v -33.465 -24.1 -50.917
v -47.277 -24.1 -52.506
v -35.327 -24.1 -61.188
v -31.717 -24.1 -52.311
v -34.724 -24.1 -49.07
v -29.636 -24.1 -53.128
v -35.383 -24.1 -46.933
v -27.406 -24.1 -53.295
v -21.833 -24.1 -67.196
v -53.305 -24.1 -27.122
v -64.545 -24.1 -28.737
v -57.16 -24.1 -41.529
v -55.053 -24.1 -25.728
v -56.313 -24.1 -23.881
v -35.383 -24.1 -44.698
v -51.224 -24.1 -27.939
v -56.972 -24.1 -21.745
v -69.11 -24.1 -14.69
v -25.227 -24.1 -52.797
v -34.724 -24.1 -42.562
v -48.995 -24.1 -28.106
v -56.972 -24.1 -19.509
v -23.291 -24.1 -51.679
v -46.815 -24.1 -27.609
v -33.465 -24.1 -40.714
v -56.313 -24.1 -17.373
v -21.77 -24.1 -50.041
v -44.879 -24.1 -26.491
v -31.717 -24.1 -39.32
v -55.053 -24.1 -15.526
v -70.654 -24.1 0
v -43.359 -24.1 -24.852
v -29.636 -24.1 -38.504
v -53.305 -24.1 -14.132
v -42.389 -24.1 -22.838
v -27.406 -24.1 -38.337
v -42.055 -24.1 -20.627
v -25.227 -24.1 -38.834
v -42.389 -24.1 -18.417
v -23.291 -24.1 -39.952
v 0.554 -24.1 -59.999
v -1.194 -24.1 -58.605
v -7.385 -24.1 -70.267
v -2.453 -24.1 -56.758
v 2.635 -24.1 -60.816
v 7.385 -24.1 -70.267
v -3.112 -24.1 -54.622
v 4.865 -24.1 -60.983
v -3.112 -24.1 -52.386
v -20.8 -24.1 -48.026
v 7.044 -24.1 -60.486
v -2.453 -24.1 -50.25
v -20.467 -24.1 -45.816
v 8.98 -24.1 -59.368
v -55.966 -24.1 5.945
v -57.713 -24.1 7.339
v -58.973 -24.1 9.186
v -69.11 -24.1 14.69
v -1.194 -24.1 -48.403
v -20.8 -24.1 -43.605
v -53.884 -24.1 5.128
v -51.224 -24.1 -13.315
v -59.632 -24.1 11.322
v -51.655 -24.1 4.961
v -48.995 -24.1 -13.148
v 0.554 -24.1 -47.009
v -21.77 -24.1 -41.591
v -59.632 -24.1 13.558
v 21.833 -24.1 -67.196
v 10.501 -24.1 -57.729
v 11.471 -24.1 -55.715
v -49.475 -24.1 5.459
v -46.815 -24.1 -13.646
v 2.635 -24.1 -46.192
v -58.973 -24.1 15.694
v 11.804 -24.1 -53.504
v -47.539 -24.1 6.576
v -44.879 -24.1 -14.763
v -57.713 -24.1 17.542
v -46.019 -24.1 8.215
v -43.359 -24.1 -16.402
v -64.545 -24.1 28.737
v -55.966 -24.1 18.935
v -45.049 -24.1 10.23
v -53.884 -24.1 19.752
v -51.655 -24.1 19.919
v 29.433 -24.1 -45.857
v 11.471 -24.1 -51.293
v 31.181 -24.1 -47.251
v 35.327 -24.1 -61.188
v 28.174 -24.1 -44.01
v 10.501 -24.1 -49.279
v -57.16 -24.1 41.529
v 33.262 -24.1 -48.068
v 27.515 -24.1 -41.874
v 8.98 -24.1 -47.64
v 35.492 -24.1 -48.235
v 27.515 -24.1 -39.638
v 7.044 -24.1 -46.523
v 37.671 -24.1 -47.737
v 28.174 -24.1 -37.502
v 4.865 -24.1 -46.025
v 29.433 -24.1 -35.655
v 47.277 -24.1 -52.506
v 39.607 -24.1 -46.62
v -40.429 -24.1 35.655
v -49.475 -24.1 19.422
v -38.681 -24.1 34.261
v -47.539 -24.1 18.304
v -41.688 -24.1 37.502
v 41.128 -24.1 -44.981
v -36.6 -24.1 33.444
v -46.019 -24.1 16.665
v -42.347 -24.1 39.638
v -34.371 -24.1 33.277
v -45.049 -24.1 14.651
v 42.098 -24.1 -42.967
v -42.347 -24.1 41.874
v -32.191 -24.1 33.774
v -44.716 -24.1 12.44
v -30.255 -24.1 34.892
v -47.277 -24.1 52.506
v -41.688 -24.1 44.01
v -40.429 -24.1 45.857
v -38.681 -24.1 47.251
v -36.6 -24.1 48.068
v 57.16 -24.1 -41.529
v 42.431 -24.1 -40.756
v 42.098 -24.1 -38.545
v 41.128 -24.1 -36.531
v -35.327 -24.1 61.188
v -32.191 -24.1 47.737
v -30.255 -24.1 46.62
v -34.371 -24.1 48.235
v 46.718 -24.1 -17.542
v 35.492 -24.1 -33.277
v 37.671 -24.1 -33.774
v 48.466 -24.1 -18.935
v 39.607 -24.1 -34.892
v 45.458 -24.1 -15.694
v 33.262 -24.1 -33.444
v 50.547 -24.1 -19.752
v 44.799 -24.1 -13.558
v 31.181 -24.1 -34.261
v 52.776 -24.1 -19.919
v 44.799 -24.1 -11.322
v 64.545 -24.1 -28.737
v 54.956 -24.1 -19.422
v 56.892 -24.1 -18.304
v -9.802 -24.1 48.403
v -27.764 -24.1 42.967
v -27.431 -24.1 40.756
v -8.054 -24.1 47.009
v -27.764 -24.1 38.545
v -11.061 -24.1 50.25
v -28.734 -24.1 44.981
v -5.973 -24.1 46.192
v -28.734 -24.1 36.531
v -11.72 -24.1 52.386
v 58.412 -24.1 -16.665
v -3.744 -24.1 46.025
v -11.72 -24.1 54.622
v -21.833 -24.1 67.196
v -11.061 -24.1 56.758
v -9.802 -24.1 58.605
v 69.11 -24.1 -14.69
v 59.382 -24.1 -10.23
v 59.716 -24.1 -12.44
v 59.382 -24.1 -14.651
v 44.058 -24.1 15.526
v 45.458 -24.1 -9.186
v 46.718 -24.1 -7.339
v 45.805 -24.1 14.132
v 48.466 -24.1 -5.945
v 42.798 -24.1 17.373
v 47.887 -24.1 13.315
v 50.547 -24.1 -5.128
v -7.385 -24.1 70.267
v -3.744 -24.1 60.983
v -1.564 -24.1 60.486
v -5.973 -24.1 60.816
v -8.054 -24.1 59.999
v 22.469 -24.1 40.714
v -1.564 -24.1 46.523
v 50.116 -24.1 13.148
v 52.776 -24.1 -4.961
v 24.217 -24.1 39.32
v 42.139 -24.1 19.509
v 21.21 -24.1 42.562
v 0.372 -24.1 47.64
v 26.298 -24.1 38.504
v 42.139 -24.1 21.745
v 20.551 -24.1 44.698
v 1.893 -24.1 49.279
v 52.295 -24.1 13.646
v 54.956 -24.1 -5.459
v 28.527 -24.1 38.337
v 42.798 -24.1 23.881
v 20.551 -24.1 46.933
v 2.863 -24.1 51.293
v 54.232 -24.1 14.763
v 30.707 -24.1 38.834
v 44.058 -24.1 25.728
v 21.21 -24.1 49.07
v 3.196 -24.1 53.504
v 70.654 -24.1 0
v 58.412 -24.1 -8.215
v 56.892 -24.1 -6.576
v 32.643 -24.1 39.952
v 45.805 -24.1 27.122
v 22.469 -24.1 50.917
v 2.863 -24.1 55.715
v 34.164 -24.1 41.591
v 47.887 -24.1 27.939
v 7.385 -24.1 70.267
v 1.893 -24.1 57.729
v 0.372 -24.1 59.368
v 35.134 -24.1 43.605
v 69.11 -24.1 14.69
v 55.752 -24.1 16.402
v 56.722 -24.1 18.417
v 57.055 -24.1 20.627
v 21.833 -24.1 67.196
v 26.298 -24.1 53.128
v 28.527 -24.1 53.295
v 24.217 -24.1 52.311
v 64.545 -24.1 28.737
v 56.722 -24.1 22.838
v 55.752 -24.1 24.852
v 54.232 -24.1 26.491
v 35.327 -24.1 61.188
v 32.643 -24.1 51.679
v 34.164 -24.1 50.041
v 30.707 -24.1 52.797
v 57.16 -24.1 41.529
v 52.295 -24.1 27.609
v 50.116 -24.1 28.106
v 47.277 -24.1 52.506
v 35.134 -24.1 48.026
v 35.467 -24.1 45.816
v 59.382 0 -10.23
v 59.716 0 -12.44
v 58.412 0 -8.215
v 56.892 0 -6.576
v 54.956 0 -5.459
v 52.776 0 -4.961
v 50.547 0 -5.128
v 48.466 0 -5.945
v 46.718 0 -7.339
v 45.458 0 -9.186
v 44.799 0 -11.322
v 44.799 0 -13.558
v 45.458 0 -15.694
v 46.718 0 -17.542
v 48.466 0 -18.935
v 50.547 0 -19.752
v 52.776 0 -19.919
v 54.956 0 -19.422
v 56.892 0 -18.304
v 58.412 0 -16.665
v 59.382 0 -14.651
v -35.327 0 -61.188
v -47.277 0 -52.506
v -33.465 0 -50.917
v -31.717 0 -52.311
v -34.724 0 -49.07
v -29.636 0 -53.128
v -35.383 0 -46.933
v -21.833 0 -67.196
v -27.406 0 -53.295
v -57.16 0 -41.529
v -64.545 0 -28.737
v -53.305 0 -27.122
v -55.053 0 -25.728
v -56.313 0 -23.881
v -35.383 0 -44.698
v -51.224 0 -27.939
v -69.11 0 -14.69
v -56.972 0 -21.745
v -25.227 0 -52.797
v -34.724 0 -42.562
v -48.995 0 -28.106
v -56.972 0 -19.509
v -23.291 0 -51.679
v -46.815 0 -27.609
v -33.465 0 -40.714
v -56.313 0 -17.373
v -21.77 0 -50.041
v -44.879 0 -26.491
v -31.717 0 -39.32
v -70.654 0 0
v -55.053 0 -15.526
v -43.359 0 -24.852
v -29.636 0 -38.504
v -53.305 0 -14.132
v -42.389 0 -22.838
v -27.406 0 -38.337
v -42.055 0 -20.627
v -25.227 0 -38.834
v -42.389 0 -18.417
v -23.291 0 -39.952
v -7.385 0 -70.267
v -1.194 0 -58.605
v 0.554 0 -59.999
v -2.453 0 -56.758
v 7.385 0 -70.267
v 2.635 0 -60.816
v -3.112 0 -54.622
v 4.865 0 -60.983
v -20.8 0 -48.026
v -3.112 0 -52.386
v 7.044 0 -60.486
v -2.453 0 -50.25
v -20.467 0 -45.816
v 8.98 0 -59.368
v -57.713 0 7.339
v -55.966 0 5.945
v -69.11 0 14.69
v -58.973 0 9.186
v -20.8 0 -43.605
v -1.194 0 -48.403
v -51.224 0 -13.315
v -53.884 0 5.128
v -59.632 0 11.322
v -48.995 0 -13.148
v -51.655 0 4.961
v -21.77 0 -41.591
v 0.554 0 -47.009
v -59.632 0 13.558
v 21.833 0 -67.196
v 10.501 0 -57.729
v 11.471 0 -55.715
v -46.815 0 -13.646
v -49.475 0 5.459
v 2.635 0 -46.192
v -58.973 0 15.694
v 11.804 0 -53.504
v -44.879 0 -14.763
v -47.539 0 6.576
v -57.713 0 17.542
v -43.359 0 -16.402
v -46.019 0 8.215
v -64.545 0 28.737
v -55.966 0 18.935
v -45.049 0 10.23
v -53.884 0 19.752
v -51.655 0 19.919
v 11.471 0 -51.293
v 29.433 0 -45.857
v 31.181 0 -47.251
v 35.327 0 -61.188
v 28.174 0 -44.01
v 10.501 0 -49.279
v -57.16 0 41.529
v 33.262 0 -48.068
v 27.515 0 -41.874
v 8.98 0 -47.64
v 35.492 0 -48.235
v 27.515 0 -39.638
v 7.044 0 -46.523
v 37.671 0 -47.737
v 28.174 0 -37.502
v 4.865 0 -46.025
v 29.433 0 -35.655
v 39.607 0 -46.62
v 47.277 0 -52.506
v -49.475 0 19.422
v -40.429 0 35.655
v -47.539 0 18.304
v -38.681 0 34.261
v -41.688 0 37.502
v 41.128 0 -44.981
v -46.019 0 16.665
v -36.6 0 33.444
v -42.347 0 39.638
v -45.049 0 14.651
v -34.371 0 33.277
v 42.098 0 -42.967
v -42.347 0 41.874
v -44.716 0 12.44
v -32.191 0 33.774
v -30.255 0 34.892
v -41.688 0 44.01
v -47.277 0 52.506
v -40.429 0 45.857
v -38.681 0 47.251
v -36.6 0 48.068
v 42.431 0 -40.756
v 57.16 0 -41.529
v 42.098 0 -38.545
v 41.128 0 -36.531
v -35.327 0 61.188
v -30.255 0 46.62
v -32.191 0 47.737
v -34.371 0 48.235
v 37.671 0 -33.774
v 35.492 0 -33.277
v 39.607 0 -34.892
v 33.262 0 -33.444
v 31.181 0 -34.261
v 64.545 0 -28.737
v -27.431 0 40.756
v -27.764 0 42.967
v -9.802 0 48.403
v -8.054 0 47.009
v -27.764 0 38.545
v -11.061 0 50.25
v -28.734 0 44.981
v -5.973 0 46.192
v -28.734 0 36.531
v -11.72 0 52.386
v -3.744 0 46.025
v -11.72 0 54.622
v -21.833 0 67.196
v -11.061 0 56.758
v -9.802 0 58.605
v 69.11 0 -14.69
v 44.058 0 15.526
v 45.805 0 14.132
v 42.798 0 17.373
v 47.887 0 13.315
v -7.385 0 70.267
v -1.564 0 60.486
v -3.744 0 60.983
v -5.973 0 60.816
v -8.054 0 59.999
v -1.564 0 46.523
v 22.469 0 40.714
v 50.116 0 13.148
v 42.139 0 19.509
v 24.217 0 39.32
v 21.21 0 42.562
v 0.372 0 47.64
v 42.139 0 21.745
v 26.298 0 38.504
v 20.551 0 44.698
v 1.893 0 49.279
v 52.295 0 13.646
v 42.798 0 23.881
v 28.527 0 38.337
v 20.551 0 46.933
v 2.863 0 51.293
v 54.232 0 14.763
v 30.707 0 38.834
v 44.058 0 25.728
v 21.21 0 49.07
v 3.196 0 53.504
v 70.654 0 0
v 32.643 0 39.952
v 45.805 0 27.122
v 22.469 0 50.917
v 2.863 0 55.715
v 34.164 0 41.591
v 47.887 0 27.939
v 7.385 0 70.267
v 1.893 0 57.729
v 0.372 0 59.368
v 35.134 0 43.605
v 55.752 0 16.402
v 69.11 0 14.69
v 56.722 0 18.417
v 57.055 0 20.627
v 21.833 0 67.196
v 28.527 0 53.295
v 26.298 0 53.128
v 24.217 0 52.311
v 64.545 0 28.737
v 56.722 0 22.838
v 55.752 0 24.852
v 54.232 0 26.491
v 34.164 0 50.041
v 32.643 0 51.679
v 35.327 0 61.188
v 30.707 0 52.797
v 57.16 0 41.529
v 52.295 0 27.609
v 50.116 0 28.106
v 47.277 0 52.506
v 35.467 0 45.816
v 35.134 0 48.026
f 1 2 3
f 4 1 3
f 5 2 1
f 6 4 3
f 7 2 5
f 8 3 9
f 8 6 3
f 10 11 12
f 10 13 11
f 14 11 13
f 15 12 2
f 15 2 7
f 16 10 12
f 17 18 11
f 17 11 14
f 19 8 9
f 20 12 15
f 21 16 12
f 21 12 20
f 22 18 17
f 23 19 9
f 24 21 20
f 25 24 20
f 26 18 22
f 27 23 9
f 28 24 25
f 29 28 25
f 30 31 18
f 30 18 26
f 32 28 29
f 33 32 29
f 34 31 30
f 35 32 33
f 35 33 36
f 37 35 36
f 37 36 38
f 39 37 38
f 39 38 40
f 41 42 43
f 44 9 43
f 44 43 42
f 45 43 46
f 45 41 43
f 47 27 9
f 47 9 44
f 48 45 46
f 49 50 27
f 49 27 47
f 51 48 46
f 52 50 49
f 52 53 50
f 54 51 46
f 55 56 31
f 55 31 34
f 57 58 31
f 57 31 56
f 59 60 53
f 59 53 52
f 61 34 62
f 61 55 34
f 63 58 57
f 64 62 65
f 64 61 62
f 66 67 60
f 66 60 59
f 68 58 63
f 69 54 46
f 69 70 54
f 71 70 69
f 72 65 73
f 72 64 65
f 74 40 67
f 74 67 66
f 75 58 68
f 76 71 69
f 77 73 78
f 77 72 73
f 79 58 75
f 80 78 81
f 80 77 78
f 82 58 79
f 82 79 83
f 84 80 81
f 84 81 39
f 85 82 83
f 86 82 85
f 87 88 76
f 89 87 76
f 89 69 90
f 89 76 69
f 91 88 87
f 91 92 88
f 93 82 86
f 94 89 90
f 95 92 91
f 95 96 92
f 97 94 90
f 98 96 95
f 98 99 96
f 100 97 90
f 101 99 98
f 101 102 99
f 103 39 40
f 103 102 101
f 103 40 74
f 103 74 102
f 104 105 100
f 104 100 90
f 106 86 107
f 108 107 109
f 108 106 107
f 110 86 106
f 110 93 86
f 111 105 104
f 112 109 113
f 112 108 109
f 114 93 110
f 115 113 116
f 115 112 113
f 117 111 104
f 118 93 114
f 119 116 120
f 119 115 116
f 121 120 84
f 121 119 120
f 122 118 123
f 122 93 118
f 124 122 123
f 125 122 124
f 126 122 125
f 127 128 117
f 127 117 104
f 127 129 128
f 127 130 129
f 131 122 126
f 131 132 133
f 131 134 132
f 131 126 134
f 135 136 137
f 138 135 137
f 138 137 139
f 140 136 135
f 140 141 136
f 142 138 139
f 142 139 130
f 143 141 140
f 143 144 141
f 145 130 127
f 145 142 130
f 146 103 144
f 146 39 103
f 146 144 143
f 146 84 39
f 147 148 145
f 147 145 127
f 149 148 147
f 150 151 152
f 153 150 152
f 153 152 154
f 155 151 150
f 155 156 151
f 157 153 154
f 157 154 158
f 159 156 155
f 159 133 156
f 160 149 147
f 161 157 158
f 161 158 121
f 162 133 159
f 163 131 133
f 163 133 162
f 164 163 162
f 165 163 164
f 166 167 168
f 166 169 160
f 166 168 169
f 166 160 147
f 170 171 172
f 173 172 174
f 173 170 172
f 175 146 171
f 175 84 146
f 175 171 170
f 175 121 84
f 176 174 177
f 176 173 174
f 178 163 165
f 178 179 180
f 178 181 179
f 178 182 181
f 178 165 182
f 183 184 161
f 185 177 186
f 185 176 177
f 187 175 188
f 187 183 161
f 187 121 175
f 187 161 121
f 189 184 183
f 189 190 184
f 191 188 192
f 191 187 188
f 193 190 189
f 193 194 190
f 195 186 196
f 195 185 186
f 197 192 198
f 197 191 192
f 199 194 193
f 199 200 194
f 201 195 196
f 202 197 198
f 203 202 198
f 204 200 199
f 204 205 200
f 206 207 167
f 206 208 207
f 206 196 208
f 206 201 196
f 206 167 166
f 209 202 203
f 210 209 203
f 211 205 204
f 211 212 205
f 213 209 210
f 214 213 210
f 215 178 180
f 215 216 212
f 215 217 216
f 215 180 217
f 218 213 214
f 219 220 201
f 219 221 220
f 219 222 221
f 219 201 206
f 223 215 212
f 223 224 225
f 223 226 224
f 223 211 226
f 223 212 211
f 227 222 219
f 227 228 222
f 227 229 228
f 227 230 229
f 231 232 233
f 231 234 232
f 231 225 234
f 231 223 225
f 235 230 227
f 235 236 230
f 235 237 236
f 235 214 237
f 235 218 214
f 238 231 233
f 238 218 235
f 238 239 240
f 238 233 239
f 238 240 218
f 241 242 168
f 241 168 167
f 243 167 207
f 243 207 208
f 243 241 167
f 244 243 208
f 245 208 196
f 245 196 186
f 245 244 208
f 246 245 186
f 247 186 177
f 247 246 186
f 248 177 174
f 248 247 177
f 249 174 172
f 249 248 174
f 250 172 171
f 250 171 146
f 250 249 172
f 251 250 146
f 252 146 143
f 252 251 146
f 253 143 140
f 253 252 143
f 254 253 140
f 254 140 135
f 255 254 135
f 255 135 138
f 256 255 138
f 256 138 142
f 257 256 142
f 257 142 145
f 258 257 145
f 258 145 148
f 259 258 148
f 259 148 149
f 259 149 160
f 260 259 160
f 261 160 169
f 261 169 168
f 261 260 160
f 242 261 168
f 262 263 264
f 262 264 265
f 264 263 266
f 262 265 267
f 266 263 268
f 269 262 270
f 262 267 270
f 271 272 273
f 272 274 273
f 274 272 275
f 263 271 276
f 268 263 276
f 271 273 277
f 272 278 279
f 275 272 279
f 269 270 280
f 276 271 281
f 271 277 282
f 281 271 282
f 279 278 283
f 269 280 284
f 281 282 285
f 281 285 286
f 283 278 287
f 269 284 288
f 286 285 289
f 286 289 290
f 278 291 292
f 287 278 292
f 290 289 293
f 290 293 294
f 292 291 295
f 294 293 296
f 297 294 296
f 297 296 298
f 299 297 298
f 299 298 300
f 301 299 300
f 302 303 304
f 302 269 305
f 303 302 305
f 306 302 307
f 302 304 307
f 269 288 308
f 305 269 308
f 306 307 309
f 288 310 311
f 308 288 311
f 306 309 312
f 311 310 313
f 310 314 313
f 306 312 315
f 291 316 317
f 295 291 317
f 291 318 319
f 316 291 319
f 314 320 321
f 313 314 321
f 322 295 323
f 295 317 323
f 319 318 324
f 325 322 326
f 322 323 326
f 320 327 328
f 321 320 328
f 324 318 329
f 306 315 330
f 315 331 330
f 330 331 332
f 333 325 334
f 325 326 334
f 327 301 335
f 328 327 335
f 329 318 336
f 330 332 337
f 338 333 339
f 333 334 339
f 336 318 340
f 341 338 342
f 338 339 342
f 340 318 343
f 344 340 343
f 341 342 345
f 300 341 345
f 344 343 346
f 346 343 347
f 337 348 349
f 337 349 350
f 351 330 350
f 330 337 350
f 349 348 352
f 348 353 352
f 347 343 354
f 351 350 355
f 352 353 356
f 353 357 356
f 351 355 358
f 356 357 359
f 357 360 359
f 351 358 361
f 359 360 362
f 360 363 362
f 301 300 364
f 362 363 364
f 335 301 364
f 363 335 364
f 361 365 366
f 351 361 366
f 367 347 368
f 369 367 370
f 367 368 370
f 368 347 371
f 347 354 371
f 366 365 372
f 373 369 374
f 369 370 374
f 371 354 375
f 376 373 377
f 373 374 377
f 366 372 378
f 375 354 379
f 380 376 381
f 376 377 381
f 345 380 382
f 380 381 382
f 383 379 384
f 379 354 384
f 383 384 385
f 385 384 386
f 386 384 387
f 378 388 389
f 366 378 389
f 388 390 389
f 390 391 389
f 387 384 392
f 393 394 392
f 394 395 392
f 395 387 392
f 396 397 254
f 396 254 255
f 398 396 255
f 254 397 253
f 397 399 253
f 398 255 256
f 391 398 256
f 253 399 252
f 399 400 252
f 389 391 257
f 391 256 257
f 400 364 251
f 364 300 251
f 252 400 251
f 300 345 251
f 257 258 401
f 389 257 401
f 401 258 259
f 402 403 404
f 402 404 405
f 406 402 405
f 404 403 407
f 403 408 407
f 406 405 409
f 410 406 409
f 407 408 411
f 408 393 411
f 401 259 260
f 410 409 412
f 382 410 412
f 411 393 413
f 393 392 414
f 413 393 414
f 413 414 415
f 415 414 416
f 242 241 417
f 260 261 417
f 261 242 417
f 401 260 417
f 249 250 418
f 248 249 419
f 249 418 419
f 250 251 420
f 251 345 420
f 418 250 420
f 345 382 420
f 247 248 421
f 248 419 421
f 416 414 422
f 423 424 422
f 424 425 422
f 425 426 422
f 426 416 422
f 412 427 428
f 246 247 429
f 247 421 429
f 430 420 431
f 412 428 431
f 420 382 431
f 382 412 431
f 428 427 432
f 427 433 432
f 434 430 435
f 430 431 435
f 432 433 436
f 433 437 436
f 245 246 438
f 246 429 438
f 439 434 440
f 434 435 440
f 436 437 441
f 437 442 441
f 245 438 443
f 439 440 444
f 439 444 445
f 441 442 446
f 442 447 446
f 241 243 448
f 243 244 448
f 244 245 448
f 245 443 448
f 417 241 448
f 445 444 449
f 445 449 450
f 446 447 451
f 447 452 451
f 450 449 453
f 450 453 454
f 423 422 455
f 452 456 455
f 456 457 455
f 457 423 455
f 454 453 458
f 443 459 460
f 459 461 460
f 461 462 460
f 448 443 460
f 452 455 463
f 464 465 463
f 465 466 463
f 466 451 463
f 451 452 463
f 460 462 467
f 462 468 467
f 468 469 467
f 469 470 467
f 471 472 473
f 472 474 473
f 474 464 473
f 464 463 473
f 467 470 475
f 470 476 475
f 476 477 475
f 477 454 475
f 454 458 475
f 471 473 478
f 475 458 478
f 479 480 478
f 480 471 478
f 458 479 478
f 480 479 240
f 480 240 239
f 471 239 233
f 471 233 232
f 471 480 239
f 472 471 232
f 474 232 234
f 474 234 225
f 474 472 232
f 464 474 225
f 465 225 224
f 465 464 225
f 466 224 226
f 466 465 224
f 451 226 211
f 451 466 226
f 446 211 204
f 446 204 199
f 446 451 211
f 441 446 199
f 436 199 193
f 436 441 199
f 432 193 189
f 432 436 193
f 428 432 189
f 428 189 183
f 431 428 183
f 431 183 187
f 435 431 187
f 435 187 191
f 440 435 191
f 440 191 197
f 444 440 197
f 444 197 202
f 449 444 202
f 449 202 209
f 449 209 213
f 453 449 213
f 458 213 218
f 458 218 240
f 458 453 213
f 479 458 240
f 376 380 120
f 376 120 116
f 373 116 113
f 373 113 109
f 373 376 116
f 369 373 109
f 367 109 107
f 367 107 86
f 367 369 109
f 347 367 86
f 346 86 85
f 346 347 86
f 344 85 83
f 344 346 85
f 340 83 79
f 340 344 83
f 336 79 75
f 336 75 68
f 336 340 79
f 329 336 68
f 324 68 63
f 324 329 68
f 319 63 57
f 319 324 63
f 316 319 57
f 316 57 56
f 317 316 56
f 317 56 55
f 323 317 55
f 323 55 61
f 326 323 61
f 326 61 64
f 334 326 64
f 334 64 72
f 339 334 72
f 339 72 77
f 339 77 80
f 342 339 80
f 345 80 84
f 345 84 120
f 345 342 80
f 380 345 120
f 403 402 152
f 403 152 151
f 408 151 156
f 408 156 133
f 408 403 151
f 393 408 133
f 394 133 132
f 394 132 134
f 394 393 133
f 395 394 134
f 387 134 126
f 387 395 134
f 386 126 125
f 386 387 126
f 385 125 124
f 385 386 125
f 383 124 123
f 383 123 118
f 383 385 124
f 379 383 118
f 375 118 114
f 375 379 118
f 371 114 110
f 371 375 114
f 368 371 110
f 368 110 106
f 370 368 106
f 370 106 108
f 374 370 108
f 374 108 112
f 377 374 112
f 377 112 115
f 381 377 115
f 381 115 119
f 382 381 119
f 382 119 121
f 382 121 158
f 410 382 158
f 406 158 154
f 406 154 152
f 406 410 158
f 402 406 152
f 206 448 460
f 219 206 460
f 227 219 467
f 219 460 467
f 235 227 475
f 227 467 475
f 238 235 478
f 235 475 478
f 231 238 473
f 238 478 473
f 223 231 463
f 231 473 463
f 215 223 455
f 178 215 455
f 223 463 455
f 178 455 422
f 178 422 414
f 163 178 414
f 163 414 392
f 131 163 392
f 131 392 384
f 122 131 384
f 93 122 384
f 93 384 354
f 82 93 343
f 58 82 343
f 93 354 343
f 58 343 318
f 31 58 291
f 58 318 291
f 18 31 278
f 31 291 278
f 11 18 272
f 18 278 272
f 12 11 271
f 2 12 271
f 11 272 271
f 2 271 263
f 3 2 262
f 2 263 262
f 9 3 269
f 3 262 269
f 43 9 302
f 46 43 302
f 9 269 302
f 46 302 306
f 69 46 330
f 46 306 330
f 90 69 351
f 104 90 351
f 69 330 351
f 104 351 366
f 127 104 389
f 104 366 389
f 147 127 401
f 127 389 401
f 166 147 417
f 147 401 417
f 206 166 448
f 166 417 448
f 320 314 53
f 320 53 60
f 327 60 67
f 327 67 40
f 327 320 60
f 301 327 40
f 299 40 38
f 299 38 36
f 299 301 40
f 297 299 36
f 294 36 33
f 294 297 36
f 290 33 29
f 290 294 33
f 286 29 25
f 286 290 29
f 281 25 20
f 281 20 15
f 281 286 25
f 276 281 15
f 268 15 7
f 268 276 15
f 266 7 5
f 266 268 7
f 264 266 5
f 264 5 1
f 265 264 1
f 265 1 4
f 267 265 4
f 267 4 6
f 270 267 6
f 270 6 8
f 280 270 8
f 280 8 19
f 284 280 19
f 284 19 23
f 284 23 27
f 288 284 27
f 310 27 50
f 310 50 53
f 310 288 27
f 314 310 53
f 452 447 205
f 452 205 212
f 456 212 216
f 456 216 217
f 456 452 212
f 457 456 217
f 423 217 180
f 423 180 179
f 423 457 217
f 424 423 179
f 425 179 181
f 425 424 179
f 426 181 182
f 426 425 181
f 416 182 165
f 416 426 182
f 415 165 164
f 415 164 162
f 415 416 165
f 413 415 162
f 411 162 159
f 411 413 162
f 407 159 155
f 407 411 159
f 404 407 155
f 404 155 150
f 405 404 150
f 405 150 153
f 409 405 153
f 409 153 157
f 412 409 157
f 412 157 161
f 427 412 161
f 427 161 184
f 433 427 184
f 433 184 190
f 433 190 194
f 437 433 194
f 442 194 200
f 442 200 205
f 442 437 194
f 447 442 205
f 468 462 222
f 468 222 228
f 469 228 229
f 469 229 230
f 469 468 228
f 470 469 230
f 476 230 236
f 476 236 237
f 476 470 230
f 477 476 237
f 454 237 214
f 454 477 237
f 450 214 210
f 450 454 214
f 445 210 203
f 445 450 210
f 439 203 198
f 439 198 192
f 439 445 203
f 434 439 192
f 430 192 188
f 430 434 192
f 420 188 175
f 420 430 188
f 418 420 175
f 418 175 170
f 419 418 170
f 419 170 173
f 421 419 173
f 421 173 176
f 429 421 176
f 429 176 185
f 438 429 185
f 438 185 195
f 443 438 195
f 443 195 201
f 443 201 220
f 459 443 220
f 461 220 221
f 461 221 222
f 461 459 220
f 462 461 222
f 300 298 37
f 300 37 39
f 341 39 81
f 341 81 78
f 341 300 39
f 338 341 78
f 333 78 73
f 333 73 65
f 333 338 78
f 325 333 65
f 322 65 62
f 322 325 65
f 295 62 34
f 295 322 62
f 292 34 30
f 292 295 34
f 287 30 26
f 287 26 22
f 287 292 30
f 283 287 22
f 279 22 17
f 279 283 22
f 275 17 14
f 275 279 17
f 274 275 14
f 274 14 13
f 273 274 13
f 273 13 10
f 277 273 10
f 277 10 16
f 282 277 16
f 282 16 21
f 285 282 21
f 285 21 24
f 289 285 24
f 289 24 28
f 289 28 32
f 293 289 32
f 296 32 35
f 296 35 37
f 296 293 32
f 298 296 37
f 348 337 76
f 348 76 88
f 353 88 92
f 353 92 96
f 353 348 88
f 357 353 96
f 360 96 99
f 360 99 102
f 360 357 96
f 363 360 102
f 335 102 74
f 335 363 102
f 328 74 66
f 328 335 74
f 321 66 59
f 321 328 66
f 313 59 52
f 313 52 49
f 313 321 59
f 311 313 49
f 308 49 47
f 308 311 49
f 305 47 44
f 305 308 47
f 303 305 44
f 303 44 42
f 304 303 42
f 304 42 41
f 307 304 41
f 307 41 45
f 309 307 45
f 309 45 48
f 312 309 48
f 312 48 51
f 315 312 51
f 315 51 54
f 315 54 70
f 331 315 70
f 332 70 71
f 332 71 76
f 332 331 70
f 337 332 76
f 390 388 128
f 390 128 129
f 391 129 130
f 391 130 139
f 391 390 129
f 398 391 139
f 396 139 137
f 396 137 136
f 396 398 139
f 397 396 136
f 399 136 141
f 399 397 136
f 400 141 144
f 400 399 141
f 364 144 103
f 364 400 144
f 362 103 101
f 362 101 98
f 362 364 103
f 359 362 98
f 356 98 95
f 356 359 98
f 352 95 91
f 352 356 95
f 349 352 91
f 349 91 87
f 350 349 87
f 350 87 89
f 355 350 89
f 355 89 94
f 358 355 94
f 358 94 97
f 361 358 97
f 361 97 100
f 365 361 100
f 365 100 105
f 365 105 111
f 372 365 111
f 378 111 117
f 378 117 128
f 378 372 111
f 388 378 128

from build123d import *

# Parameters (mm, degrees)
F0_R     = 70.653692
F0_R_2   = 7.5
F1_DEPTH = 24.1


with BuildPart() as f1:
    # F0 (on Front) → F1 (new body)
    with BuildSketch(Plane.XZ):
        Circle(F0_R)
        with Locations((-27.966831, -45.815672)):
            Circle(F0_R_2, mode=Mode.SUBTRACT)
        with Locations((-49.555418, -20.627166)):
            Circle(F0_R_2, mode=Mode.SUBTRACT)
        with Locations((4.304135, -53.504148)):
            Circle(F0_R_2, mode=Mode.SUBTRACT)
        with Locations((34.931067, -40.755858)):
            Circle(F0_R_2, mode=Mode.SUBTRACT)
        with Locations((52.215519, -12.440216)):
            Circle(F0_R_2, mode=Mode.SUBTRACT)
        with Locations((-52.215519, 12.440216)):
            Circle(F0_R_2, mode=Mode.SUBTRACT)
        with Locations((-34.931067, 40.755858)):
            Circle(F0_R_2, mode=Mode.SUBTRACT)
        with Locations((-4.304135, 53.504148)):
            Circle(F0_R_2, mode=Mode.SUBTRACT)
        with Locations((49.555418, 20.627166)):
            Circle(F0_R_2, mode=Mode.SUBTRACT)
        with Locations((27.966831, 45.815672)):
            Circle(F0_R_2, mode=Mode.SUBTRACT)
    extrude(amount=F1_DEPTH)


solid = f1.part
